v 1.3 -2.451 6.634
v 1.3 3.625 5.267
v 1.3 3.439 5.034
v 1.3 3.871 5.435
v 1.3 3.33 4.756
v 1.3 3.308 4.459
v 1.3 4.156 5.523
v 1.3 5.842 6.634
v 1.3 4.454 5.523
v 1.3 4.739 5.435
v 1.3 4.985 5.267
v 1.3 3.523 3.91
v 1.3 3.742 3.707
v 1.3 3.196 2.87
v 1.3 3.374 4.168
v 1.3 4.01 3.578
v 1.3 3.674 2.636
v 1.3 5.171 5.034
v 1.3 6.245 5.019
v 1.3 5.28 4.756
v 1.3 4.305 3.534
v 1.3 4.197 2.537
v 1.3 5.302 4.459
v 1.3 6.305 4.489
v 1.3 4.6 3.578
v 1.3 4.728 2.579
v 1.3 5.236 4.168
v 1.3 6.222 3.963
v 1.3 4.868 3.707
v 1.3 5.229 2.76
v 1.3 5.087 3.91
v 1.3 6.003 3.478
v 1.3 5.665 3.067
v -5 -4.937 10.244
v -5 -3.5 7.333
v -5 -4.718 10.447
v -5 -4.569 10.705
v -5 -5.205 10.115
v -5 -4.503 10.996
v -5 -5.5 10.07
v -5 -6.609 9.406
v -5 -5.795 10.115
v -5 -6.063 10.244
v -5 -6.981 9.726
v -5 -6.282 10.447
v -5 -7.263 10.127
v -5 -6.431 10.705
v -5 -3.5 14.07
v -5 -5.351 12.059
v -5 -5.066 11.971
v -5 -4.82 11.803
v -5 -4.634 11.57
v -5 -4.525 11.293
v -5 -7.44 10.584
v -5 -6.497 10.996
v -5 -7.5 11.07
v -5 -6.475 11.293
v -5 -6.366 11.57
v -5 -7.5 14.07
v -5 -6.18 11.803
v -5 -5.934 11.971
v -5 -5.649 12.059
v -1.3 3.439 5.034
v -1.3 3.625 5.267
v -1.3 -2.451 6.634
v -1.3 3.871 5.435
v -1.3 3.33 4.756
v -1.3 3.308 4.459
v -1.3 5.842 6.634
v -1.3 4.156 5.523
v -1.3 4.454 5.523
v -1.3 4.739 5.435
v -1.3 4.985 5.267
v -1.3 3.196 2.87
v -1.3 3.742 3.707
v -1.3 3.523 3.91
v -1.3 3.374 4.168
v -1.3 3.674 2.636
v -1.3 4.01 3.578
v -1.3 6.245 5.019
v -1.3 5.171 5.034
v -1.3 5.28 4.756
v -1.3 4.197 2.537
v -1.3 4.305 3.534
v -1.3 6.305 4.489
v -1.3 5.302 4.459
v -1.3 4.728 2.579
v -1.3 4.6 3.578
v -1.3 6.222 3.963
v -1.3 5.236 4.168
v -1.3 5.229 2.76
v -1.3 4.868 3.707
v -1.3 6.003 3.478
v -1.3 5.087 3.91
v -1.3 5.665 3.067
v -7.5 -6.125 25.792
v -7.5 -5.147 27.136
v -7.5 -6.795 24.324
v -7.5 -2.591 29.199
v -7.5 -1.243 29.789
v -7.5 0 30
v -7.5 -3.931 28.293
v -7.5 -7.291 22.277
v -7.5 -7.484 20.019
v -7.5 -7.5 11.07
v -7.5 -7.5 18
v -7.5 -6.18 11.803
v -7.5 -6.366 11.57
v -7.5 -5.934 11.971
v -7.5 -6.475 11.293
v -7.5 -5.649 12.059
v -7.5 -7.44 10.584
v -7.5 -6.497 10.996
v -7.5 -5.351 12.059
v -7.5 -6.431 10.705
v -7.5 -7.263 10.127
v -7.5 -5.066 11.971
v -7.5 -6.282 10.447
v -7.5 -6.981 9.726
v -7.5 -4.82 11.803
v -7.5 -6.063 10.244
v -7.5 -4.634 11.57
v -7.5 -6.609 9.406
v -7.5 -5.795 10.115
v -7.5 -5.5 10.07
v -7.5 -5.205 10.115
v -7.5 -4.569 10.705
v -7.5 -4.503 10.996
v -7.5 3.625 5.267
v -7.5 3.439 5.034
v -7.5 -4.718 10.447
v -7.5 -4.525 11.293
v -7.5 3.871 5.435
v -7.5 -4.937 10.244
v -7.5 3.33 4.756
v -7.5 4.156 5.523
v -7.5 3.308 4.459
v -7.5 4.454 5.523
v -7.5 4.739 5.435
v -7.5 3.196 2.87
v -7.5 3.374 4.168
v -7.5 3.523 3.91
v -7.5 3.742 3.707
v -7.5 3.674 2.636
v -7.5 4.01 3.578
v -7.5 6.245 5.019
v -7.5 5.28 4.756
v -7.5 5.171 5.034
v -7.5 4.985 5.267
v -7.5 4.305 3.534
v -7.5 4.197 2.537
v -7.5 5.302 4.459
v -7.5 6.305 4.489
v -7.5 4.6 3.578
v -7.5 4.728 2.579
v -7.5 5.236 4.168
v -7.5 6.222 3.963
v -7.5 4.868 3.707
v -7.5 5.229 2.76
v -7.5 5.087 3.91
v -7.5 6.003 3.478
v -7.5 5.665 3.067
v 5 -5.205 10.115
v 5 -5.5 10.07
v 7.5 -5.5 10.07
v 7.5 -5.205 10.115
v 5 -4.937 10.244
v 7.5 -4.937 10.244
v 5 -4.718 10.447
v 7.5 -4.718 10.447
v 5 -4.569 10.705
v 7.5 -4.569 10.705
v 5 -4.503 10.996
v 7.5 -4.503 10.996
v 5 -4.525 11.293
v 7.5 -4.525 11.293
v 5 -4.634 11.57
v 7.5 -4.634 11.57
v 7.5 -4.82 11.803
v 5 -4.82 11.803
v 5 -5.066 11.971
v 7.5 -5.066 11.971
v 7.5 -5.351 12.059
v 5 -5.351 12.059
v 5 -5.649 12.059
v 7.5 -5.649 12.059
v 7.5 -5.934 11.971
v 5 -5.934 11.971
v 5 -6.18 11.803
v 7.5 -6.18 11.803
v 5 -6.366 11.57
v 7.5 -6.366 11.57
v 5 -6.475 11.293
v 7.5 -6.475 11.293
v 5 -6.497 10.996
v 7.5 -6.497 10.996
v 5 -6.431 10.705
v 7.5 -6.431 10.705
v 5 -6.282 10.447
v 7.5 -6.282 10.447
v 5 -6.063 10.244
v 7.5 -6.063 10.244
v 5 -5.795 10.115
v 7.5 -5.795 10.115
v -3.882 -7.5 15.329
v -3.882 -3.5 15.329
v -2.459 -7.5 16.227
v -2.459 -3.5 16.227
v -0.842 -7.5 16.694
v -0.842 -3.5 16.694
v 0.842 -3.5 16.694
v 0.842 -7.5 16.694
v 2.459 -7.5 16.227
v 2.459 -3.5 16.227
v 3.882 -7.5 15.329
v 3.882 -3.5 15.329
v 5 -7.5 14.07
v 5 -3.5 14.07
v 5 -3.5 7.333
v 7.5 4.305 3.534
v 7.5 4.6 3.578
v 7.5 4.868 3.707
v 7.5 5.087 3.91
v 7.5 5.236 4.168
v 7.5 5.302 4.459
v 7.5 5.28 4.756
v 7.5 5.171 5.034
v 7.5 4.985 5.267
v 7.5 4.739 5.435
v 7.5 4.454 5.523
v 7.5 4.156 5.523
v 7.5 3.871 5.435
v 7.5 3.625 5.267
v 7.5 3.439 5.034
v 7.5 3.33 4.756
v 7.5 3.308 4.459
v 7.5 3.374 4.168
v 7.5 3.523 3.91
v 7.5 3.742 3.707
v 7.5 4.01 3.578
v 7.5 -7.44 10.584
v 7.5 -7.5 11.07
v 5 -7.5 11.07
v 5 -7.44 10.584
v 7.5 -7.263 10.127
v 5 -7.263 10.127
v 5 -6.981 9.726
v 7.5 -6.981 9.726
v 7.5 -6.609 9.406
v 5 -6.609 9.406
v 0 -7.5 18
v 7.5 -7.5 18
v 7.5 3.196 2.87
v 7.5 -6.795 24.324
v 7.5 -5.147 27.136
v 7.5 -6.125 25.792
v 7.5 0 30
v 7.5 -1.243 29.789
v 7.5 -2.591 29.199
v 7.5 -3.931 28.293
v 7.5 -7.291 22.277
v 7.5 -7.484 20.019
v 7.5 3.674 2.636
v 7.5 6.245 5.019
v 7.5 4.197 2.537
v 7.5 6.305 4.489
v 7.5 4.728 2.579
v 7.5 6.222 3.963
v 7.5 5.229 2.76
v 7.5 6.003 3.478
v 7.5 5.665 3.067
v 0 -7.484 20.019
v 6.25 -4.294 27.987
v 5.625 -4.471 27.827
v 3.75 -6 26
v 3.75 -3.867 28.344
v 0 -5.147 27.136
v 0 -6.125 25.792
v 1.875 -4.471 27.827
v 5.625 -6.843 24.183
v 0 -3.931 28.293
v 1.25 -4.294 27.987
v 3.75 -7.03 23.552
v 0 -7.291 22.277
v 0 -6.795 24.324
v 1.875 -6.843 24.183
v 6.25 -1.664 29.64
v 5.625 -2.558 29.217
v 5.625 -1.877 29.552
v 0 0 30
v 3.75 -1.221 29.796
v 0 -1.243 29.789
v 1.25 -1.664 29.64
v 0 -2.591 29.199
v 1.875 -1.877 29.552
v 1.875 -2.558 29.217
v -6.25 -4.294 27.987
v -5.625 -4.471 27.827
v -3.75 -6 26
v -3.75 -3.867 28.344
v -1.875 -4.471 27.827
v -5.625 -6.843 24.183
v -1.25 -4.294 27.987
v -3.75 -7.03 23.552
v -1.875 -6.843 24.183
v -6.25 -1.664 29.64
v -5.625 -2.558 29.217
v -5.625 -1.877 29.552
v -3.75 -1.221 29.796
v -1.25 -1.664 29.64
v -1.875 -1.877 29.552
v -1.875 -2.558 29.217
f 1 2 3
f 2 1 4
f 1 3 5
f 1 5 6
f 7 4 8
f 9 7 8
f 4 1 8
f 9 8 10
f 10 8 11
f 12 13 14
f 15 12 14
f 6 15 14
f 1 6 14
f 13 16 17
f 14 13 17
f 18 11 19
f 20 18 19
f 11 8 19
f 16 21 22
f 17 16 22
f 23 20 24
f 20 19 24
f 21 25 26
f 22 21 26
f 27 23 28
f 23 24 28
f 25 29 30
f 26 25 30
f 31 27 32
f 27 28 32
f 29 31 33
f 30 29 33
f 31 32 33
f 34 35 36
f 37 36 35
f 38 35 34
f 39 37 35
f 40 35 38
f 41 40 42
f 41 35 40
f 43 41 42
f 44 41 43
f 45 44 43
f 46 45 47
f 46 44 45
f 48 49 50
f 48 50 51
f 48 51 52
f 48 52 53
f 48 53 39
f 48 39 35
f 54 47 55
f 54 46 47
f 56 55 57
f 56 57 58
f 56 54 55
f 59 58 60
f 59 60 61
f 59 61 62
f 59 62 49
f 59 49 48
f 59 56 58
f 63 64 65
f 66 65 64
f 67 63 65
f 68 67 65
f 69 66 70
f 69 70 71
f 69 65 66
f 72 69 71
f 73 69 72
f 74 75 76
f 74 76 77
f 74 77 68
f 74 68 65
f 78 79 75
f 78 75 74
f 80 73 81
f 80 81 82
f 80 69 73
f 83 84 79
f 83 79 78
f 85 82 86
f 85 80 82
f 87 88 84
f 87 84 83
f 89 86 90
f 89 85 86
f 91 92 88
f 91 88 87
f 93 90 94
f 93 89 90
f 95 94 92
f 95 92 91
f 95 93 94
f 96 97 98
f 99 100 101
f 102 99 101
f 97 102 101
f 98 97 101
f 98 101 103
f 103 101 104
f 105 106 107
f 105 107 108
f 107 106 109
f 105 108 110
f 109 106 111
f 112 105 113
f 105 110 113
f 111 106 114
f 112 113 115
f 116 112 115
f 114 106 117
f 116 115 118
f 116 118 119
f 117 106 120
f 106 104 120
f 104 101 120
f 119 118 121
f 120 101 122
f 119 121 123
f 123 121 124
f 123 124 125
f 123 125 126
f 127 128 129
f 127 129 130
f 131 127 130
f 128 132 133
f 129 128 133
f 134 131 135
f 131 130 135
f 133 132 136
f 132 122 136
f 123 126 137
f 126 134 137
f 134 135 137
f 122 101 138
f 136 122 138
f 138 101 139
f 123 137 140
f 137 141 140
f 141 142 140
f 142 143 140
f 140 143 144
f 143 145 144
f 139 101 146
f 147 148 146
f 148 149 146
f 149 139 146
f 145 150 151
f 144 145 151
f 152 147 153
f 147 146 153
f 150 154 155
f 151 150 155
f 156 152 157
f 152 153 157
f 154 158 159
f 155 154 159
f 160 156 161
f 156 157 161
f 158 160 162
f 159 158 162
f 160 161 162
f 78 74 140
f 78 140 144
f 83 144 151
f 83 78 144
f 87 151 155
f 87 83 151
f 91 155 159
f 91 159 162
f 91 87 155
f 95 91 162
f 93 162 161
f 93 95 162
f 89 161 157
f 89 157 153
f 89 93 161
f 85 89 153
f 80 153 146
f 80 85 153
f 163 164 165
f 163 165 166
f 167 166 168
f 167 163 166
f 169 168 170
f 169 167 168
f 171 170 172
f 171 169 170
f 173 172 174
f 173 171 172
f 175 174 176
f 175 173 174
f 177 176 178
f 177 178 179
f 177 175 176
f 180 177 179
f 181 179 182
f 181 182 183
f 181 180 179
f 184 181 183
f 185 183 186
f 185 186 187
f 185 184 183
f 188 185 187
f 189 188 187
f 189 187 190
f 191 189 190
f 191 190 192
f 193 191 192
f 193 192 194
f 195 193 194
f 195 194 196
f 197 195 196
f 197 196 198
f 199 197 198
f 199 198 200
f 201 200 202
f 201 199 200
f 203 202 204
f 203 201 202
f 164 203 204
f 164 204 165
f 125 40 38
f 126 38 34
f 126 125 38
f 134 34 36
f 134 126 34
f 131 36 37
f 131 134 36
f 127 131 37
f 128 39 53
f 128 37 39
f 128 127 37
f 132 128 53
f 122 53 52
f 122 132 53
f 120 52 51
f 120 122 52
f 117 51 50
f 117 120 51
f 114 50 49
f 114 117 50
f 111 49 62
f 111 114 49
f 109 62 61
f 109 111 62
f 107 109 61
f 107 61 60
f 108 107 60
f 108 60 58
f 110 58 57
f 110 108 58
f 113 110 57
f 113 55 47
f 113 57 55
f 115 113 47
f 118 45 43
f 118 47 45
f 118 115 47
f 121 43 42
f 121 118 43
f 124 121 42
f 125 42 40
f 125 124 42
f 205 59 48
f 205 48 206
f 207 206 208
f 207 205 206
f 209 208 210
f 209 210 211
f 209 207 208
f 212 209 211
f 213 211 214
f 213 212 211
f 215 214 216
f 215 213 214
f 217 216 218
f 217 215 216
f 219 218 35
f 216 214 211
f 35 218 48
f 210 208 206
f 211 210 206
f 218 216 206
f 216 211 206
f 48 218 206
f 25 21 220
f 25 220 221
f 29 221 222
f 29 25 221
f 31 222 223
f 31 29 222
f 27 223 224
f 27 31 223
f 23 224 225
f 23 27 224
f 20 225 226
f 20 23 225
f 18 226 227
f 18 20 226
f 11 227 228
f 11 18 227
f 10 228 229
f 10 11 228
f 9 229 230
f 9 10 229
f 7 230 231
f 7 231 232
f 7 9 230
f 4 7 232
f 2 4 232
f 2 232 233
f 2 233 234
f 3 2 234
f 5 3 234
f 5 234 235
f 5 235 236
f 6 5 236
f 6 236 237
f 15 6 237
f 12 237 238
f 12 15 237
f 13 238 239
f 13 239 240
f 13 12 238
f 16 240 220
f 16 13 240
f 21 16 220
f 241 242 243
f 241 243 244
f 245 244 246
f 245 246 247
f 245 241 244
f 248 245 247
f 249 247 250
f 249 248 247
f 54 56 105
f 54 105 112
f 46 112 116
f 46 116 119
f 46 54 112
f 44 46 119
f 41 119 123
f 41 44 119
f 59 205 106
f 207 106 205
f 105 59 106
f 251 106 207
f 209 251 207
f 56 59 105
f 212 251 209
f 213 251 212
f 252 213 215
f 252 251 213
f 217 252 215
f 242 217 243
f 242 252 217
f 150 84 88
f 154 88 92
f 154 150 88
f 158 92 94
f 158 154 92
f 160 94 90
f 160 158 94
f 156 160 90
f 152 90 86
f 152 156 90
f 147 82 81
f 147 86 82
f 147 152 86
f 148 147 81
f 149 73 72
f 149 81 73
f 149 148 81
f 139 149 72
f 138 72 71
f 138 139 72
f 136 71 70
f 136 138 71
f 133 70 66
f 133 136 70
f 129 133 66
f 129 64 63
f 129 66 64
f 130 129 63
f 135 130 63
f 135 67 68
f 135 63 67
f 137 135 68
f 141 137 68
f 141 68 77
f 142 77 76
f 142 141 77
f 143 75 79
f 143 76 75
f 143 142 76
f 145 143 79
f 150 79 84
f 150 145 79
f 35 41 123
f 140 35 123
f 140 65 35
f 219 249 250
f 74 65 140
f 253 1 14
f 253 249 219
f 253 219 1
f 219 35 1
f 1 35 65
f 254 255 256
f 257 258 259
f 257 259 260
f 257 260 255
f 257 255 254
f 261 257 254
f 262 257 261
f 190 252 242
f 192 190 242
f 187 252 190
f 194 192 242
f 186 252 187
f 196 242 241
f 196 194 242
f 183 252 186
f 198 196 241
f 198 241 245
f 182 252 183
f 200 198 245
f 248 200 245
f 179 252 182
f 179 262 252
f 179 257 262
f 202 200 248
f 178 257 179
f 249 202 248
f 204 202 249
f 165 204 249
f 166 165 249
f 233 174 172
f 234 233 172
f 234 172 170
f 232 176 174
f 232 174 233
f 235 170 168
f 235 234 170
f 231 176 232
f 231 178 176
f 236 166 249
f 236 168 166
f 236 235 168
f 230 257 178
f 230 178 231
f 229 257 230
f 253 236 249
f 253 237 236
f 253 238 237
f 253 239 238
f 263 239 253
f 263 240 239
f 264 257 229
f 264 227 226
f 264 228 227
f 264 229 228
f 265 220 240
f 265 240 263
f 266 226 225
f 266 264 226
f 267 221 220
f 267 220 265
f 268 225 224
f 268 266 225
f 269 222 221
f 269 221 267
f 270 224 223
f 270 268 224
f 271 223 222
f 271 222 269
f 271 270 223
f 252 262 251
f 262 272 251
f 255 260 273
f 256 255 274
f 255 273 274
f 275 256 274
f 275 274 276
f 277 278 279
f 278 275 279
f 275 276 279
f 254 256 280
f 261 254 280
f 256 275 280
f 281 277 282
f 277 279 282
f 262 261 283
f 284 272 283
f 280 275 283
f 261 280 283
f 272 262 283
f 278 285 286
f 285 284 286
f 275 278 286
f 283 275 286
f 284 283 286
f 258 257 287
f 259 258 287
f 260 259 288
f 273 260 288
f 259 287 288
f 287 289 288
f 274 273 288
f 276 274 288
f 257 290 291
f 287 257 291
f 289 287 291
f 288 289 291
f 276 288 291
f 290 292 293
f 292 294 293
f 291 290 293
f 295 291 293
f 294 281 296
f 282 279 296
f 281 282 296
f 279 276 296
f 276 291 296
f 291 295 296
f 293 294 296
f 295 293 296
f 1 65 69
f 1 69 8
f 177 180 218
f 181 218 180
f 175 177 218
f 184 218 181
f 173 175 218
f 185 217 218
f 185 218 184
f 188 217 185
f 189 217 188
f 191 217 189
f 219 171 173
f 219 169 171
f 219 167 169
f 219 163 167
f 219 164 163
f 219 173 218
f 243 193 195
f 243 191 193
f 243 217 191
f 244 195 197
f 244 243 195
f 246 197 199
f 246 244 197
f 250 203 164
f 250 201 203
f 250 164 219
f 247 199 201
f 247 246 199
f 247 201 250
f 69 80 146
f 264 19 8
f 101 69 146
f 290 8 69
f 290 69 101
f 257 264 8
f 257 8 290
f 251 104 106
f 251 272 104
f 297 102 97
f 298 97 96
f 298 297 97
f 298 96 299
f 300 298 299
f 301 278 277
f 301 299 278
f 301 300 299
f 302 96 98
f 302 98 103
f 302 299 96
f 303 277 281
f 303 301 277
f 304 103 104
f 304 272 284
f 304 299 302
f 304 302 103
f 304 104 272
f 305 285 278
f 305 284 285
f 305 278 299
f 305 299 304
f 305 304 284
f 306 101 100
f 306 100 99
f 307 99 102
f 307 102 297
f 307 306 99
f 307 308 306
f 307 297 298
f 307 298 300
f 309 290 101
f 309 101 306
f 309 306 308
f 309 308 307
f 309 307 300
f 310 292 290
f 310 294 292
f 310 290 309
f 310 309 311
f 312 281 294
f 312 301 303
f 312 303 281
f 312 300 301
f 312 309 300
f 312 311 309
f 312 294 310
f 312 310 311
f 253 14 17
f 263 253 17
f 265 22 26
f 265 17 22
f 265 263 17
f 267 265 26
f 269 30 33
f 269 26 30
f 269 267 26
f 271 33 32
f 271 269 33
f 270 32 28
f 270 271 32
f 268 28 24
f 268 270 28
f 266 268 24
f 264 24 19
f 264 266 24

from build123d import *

# Parameters (mm, degrees)
SKETCH2_R           = 1
BOSS_EXTRUDE1_DEPTH = 7.5
SKETCH4_W           = 2.6
SKETCH4_H           = 4.1
CUT_EXTRUDE1_DEPTH  = 15
CUT_EXTRUDE3_DEPTH  = 4


with BuildPart() as part:
    # Sketch2 → Boss-Extrude1 (new body, symmetric)
    with BuildSketch(Plane(origin=(0, 0, 0), x_dir=(0, 0, -1), z_dir=(1, 0, 0))):
        with BuildLine():
            Line((-5.018754521, 6.24531137), (-30, 0))
            add(Edge.make_bspline(
                [(-30, 0), (-30, -1.862010614), (-26.296905553, -7.670881077), (-20.233591891, -7.5), (-18, -7.5)],
                knots=[0, 0, 0, 0, 0.469762973, 1, 1, 1, 1], degree=3))
            Line((-18, -7.5), (-11.070367517, -7.5))
            ThreePointArc((-11.070367517, -7.5), (-10.126651666, -7.263349198), (-9.406266928, -6.609400392))
            Line((-9.406266928, -6.609400392), (-2.869582682, 3.195625977))
            ThreePointArc((-2.869582682, 3.195625977), (-2.89885215, 5.457123243), (-5.018754521, 6.24531137))
        make_face()
        with Locations((-4.533683271, 4.30502637)):
            Circle(SKETCH2_R, mode=Mode.SUBTRACT)
        with Locations((-11.070367517, -5.5)):
            Circle(SKETCH2_R, mode=Mode.SUBTRACT)
    extrude(amount=BOSS_EXTRUDE1_DEPTH, both=True)

    # Sketch4 → Cut-Extrude1 (cut)
    with BuildSketch(Plane(origin=(0, 6.30502637, 0), x_dir=(1, 0, 0), z_dir=(0, 1, 0))):
        with Locations((0, -4.583683271)):
            Rectangle(SKETCH4_W, SKETCH4_H)
    extrude(amount=-CUT_EXTRUDE1_DEPTH, mode=Mode.SUBTRACT)

    # Sketch5 → Cut-Extrude3 (cut)
    with BuildSketch(Plane.XZ.offset(7.5)):
        with BuildLine():
            Line((5, 7.070367517), (-5, 7.070367517))
            Line((-5, 7.070367517), (-5, 14.070367517))
            ThreePointArc((-5, 14.070367517), (0, 16.753742727), (5, 14.070367517))
            Line((5, 14.070367517), (5, 7.070367517))
        make_face()
    extrude(amount=-CUT_EXTRUDE3_DEPTH, mode=Mode.SUBTRACT)


solid = part.part
